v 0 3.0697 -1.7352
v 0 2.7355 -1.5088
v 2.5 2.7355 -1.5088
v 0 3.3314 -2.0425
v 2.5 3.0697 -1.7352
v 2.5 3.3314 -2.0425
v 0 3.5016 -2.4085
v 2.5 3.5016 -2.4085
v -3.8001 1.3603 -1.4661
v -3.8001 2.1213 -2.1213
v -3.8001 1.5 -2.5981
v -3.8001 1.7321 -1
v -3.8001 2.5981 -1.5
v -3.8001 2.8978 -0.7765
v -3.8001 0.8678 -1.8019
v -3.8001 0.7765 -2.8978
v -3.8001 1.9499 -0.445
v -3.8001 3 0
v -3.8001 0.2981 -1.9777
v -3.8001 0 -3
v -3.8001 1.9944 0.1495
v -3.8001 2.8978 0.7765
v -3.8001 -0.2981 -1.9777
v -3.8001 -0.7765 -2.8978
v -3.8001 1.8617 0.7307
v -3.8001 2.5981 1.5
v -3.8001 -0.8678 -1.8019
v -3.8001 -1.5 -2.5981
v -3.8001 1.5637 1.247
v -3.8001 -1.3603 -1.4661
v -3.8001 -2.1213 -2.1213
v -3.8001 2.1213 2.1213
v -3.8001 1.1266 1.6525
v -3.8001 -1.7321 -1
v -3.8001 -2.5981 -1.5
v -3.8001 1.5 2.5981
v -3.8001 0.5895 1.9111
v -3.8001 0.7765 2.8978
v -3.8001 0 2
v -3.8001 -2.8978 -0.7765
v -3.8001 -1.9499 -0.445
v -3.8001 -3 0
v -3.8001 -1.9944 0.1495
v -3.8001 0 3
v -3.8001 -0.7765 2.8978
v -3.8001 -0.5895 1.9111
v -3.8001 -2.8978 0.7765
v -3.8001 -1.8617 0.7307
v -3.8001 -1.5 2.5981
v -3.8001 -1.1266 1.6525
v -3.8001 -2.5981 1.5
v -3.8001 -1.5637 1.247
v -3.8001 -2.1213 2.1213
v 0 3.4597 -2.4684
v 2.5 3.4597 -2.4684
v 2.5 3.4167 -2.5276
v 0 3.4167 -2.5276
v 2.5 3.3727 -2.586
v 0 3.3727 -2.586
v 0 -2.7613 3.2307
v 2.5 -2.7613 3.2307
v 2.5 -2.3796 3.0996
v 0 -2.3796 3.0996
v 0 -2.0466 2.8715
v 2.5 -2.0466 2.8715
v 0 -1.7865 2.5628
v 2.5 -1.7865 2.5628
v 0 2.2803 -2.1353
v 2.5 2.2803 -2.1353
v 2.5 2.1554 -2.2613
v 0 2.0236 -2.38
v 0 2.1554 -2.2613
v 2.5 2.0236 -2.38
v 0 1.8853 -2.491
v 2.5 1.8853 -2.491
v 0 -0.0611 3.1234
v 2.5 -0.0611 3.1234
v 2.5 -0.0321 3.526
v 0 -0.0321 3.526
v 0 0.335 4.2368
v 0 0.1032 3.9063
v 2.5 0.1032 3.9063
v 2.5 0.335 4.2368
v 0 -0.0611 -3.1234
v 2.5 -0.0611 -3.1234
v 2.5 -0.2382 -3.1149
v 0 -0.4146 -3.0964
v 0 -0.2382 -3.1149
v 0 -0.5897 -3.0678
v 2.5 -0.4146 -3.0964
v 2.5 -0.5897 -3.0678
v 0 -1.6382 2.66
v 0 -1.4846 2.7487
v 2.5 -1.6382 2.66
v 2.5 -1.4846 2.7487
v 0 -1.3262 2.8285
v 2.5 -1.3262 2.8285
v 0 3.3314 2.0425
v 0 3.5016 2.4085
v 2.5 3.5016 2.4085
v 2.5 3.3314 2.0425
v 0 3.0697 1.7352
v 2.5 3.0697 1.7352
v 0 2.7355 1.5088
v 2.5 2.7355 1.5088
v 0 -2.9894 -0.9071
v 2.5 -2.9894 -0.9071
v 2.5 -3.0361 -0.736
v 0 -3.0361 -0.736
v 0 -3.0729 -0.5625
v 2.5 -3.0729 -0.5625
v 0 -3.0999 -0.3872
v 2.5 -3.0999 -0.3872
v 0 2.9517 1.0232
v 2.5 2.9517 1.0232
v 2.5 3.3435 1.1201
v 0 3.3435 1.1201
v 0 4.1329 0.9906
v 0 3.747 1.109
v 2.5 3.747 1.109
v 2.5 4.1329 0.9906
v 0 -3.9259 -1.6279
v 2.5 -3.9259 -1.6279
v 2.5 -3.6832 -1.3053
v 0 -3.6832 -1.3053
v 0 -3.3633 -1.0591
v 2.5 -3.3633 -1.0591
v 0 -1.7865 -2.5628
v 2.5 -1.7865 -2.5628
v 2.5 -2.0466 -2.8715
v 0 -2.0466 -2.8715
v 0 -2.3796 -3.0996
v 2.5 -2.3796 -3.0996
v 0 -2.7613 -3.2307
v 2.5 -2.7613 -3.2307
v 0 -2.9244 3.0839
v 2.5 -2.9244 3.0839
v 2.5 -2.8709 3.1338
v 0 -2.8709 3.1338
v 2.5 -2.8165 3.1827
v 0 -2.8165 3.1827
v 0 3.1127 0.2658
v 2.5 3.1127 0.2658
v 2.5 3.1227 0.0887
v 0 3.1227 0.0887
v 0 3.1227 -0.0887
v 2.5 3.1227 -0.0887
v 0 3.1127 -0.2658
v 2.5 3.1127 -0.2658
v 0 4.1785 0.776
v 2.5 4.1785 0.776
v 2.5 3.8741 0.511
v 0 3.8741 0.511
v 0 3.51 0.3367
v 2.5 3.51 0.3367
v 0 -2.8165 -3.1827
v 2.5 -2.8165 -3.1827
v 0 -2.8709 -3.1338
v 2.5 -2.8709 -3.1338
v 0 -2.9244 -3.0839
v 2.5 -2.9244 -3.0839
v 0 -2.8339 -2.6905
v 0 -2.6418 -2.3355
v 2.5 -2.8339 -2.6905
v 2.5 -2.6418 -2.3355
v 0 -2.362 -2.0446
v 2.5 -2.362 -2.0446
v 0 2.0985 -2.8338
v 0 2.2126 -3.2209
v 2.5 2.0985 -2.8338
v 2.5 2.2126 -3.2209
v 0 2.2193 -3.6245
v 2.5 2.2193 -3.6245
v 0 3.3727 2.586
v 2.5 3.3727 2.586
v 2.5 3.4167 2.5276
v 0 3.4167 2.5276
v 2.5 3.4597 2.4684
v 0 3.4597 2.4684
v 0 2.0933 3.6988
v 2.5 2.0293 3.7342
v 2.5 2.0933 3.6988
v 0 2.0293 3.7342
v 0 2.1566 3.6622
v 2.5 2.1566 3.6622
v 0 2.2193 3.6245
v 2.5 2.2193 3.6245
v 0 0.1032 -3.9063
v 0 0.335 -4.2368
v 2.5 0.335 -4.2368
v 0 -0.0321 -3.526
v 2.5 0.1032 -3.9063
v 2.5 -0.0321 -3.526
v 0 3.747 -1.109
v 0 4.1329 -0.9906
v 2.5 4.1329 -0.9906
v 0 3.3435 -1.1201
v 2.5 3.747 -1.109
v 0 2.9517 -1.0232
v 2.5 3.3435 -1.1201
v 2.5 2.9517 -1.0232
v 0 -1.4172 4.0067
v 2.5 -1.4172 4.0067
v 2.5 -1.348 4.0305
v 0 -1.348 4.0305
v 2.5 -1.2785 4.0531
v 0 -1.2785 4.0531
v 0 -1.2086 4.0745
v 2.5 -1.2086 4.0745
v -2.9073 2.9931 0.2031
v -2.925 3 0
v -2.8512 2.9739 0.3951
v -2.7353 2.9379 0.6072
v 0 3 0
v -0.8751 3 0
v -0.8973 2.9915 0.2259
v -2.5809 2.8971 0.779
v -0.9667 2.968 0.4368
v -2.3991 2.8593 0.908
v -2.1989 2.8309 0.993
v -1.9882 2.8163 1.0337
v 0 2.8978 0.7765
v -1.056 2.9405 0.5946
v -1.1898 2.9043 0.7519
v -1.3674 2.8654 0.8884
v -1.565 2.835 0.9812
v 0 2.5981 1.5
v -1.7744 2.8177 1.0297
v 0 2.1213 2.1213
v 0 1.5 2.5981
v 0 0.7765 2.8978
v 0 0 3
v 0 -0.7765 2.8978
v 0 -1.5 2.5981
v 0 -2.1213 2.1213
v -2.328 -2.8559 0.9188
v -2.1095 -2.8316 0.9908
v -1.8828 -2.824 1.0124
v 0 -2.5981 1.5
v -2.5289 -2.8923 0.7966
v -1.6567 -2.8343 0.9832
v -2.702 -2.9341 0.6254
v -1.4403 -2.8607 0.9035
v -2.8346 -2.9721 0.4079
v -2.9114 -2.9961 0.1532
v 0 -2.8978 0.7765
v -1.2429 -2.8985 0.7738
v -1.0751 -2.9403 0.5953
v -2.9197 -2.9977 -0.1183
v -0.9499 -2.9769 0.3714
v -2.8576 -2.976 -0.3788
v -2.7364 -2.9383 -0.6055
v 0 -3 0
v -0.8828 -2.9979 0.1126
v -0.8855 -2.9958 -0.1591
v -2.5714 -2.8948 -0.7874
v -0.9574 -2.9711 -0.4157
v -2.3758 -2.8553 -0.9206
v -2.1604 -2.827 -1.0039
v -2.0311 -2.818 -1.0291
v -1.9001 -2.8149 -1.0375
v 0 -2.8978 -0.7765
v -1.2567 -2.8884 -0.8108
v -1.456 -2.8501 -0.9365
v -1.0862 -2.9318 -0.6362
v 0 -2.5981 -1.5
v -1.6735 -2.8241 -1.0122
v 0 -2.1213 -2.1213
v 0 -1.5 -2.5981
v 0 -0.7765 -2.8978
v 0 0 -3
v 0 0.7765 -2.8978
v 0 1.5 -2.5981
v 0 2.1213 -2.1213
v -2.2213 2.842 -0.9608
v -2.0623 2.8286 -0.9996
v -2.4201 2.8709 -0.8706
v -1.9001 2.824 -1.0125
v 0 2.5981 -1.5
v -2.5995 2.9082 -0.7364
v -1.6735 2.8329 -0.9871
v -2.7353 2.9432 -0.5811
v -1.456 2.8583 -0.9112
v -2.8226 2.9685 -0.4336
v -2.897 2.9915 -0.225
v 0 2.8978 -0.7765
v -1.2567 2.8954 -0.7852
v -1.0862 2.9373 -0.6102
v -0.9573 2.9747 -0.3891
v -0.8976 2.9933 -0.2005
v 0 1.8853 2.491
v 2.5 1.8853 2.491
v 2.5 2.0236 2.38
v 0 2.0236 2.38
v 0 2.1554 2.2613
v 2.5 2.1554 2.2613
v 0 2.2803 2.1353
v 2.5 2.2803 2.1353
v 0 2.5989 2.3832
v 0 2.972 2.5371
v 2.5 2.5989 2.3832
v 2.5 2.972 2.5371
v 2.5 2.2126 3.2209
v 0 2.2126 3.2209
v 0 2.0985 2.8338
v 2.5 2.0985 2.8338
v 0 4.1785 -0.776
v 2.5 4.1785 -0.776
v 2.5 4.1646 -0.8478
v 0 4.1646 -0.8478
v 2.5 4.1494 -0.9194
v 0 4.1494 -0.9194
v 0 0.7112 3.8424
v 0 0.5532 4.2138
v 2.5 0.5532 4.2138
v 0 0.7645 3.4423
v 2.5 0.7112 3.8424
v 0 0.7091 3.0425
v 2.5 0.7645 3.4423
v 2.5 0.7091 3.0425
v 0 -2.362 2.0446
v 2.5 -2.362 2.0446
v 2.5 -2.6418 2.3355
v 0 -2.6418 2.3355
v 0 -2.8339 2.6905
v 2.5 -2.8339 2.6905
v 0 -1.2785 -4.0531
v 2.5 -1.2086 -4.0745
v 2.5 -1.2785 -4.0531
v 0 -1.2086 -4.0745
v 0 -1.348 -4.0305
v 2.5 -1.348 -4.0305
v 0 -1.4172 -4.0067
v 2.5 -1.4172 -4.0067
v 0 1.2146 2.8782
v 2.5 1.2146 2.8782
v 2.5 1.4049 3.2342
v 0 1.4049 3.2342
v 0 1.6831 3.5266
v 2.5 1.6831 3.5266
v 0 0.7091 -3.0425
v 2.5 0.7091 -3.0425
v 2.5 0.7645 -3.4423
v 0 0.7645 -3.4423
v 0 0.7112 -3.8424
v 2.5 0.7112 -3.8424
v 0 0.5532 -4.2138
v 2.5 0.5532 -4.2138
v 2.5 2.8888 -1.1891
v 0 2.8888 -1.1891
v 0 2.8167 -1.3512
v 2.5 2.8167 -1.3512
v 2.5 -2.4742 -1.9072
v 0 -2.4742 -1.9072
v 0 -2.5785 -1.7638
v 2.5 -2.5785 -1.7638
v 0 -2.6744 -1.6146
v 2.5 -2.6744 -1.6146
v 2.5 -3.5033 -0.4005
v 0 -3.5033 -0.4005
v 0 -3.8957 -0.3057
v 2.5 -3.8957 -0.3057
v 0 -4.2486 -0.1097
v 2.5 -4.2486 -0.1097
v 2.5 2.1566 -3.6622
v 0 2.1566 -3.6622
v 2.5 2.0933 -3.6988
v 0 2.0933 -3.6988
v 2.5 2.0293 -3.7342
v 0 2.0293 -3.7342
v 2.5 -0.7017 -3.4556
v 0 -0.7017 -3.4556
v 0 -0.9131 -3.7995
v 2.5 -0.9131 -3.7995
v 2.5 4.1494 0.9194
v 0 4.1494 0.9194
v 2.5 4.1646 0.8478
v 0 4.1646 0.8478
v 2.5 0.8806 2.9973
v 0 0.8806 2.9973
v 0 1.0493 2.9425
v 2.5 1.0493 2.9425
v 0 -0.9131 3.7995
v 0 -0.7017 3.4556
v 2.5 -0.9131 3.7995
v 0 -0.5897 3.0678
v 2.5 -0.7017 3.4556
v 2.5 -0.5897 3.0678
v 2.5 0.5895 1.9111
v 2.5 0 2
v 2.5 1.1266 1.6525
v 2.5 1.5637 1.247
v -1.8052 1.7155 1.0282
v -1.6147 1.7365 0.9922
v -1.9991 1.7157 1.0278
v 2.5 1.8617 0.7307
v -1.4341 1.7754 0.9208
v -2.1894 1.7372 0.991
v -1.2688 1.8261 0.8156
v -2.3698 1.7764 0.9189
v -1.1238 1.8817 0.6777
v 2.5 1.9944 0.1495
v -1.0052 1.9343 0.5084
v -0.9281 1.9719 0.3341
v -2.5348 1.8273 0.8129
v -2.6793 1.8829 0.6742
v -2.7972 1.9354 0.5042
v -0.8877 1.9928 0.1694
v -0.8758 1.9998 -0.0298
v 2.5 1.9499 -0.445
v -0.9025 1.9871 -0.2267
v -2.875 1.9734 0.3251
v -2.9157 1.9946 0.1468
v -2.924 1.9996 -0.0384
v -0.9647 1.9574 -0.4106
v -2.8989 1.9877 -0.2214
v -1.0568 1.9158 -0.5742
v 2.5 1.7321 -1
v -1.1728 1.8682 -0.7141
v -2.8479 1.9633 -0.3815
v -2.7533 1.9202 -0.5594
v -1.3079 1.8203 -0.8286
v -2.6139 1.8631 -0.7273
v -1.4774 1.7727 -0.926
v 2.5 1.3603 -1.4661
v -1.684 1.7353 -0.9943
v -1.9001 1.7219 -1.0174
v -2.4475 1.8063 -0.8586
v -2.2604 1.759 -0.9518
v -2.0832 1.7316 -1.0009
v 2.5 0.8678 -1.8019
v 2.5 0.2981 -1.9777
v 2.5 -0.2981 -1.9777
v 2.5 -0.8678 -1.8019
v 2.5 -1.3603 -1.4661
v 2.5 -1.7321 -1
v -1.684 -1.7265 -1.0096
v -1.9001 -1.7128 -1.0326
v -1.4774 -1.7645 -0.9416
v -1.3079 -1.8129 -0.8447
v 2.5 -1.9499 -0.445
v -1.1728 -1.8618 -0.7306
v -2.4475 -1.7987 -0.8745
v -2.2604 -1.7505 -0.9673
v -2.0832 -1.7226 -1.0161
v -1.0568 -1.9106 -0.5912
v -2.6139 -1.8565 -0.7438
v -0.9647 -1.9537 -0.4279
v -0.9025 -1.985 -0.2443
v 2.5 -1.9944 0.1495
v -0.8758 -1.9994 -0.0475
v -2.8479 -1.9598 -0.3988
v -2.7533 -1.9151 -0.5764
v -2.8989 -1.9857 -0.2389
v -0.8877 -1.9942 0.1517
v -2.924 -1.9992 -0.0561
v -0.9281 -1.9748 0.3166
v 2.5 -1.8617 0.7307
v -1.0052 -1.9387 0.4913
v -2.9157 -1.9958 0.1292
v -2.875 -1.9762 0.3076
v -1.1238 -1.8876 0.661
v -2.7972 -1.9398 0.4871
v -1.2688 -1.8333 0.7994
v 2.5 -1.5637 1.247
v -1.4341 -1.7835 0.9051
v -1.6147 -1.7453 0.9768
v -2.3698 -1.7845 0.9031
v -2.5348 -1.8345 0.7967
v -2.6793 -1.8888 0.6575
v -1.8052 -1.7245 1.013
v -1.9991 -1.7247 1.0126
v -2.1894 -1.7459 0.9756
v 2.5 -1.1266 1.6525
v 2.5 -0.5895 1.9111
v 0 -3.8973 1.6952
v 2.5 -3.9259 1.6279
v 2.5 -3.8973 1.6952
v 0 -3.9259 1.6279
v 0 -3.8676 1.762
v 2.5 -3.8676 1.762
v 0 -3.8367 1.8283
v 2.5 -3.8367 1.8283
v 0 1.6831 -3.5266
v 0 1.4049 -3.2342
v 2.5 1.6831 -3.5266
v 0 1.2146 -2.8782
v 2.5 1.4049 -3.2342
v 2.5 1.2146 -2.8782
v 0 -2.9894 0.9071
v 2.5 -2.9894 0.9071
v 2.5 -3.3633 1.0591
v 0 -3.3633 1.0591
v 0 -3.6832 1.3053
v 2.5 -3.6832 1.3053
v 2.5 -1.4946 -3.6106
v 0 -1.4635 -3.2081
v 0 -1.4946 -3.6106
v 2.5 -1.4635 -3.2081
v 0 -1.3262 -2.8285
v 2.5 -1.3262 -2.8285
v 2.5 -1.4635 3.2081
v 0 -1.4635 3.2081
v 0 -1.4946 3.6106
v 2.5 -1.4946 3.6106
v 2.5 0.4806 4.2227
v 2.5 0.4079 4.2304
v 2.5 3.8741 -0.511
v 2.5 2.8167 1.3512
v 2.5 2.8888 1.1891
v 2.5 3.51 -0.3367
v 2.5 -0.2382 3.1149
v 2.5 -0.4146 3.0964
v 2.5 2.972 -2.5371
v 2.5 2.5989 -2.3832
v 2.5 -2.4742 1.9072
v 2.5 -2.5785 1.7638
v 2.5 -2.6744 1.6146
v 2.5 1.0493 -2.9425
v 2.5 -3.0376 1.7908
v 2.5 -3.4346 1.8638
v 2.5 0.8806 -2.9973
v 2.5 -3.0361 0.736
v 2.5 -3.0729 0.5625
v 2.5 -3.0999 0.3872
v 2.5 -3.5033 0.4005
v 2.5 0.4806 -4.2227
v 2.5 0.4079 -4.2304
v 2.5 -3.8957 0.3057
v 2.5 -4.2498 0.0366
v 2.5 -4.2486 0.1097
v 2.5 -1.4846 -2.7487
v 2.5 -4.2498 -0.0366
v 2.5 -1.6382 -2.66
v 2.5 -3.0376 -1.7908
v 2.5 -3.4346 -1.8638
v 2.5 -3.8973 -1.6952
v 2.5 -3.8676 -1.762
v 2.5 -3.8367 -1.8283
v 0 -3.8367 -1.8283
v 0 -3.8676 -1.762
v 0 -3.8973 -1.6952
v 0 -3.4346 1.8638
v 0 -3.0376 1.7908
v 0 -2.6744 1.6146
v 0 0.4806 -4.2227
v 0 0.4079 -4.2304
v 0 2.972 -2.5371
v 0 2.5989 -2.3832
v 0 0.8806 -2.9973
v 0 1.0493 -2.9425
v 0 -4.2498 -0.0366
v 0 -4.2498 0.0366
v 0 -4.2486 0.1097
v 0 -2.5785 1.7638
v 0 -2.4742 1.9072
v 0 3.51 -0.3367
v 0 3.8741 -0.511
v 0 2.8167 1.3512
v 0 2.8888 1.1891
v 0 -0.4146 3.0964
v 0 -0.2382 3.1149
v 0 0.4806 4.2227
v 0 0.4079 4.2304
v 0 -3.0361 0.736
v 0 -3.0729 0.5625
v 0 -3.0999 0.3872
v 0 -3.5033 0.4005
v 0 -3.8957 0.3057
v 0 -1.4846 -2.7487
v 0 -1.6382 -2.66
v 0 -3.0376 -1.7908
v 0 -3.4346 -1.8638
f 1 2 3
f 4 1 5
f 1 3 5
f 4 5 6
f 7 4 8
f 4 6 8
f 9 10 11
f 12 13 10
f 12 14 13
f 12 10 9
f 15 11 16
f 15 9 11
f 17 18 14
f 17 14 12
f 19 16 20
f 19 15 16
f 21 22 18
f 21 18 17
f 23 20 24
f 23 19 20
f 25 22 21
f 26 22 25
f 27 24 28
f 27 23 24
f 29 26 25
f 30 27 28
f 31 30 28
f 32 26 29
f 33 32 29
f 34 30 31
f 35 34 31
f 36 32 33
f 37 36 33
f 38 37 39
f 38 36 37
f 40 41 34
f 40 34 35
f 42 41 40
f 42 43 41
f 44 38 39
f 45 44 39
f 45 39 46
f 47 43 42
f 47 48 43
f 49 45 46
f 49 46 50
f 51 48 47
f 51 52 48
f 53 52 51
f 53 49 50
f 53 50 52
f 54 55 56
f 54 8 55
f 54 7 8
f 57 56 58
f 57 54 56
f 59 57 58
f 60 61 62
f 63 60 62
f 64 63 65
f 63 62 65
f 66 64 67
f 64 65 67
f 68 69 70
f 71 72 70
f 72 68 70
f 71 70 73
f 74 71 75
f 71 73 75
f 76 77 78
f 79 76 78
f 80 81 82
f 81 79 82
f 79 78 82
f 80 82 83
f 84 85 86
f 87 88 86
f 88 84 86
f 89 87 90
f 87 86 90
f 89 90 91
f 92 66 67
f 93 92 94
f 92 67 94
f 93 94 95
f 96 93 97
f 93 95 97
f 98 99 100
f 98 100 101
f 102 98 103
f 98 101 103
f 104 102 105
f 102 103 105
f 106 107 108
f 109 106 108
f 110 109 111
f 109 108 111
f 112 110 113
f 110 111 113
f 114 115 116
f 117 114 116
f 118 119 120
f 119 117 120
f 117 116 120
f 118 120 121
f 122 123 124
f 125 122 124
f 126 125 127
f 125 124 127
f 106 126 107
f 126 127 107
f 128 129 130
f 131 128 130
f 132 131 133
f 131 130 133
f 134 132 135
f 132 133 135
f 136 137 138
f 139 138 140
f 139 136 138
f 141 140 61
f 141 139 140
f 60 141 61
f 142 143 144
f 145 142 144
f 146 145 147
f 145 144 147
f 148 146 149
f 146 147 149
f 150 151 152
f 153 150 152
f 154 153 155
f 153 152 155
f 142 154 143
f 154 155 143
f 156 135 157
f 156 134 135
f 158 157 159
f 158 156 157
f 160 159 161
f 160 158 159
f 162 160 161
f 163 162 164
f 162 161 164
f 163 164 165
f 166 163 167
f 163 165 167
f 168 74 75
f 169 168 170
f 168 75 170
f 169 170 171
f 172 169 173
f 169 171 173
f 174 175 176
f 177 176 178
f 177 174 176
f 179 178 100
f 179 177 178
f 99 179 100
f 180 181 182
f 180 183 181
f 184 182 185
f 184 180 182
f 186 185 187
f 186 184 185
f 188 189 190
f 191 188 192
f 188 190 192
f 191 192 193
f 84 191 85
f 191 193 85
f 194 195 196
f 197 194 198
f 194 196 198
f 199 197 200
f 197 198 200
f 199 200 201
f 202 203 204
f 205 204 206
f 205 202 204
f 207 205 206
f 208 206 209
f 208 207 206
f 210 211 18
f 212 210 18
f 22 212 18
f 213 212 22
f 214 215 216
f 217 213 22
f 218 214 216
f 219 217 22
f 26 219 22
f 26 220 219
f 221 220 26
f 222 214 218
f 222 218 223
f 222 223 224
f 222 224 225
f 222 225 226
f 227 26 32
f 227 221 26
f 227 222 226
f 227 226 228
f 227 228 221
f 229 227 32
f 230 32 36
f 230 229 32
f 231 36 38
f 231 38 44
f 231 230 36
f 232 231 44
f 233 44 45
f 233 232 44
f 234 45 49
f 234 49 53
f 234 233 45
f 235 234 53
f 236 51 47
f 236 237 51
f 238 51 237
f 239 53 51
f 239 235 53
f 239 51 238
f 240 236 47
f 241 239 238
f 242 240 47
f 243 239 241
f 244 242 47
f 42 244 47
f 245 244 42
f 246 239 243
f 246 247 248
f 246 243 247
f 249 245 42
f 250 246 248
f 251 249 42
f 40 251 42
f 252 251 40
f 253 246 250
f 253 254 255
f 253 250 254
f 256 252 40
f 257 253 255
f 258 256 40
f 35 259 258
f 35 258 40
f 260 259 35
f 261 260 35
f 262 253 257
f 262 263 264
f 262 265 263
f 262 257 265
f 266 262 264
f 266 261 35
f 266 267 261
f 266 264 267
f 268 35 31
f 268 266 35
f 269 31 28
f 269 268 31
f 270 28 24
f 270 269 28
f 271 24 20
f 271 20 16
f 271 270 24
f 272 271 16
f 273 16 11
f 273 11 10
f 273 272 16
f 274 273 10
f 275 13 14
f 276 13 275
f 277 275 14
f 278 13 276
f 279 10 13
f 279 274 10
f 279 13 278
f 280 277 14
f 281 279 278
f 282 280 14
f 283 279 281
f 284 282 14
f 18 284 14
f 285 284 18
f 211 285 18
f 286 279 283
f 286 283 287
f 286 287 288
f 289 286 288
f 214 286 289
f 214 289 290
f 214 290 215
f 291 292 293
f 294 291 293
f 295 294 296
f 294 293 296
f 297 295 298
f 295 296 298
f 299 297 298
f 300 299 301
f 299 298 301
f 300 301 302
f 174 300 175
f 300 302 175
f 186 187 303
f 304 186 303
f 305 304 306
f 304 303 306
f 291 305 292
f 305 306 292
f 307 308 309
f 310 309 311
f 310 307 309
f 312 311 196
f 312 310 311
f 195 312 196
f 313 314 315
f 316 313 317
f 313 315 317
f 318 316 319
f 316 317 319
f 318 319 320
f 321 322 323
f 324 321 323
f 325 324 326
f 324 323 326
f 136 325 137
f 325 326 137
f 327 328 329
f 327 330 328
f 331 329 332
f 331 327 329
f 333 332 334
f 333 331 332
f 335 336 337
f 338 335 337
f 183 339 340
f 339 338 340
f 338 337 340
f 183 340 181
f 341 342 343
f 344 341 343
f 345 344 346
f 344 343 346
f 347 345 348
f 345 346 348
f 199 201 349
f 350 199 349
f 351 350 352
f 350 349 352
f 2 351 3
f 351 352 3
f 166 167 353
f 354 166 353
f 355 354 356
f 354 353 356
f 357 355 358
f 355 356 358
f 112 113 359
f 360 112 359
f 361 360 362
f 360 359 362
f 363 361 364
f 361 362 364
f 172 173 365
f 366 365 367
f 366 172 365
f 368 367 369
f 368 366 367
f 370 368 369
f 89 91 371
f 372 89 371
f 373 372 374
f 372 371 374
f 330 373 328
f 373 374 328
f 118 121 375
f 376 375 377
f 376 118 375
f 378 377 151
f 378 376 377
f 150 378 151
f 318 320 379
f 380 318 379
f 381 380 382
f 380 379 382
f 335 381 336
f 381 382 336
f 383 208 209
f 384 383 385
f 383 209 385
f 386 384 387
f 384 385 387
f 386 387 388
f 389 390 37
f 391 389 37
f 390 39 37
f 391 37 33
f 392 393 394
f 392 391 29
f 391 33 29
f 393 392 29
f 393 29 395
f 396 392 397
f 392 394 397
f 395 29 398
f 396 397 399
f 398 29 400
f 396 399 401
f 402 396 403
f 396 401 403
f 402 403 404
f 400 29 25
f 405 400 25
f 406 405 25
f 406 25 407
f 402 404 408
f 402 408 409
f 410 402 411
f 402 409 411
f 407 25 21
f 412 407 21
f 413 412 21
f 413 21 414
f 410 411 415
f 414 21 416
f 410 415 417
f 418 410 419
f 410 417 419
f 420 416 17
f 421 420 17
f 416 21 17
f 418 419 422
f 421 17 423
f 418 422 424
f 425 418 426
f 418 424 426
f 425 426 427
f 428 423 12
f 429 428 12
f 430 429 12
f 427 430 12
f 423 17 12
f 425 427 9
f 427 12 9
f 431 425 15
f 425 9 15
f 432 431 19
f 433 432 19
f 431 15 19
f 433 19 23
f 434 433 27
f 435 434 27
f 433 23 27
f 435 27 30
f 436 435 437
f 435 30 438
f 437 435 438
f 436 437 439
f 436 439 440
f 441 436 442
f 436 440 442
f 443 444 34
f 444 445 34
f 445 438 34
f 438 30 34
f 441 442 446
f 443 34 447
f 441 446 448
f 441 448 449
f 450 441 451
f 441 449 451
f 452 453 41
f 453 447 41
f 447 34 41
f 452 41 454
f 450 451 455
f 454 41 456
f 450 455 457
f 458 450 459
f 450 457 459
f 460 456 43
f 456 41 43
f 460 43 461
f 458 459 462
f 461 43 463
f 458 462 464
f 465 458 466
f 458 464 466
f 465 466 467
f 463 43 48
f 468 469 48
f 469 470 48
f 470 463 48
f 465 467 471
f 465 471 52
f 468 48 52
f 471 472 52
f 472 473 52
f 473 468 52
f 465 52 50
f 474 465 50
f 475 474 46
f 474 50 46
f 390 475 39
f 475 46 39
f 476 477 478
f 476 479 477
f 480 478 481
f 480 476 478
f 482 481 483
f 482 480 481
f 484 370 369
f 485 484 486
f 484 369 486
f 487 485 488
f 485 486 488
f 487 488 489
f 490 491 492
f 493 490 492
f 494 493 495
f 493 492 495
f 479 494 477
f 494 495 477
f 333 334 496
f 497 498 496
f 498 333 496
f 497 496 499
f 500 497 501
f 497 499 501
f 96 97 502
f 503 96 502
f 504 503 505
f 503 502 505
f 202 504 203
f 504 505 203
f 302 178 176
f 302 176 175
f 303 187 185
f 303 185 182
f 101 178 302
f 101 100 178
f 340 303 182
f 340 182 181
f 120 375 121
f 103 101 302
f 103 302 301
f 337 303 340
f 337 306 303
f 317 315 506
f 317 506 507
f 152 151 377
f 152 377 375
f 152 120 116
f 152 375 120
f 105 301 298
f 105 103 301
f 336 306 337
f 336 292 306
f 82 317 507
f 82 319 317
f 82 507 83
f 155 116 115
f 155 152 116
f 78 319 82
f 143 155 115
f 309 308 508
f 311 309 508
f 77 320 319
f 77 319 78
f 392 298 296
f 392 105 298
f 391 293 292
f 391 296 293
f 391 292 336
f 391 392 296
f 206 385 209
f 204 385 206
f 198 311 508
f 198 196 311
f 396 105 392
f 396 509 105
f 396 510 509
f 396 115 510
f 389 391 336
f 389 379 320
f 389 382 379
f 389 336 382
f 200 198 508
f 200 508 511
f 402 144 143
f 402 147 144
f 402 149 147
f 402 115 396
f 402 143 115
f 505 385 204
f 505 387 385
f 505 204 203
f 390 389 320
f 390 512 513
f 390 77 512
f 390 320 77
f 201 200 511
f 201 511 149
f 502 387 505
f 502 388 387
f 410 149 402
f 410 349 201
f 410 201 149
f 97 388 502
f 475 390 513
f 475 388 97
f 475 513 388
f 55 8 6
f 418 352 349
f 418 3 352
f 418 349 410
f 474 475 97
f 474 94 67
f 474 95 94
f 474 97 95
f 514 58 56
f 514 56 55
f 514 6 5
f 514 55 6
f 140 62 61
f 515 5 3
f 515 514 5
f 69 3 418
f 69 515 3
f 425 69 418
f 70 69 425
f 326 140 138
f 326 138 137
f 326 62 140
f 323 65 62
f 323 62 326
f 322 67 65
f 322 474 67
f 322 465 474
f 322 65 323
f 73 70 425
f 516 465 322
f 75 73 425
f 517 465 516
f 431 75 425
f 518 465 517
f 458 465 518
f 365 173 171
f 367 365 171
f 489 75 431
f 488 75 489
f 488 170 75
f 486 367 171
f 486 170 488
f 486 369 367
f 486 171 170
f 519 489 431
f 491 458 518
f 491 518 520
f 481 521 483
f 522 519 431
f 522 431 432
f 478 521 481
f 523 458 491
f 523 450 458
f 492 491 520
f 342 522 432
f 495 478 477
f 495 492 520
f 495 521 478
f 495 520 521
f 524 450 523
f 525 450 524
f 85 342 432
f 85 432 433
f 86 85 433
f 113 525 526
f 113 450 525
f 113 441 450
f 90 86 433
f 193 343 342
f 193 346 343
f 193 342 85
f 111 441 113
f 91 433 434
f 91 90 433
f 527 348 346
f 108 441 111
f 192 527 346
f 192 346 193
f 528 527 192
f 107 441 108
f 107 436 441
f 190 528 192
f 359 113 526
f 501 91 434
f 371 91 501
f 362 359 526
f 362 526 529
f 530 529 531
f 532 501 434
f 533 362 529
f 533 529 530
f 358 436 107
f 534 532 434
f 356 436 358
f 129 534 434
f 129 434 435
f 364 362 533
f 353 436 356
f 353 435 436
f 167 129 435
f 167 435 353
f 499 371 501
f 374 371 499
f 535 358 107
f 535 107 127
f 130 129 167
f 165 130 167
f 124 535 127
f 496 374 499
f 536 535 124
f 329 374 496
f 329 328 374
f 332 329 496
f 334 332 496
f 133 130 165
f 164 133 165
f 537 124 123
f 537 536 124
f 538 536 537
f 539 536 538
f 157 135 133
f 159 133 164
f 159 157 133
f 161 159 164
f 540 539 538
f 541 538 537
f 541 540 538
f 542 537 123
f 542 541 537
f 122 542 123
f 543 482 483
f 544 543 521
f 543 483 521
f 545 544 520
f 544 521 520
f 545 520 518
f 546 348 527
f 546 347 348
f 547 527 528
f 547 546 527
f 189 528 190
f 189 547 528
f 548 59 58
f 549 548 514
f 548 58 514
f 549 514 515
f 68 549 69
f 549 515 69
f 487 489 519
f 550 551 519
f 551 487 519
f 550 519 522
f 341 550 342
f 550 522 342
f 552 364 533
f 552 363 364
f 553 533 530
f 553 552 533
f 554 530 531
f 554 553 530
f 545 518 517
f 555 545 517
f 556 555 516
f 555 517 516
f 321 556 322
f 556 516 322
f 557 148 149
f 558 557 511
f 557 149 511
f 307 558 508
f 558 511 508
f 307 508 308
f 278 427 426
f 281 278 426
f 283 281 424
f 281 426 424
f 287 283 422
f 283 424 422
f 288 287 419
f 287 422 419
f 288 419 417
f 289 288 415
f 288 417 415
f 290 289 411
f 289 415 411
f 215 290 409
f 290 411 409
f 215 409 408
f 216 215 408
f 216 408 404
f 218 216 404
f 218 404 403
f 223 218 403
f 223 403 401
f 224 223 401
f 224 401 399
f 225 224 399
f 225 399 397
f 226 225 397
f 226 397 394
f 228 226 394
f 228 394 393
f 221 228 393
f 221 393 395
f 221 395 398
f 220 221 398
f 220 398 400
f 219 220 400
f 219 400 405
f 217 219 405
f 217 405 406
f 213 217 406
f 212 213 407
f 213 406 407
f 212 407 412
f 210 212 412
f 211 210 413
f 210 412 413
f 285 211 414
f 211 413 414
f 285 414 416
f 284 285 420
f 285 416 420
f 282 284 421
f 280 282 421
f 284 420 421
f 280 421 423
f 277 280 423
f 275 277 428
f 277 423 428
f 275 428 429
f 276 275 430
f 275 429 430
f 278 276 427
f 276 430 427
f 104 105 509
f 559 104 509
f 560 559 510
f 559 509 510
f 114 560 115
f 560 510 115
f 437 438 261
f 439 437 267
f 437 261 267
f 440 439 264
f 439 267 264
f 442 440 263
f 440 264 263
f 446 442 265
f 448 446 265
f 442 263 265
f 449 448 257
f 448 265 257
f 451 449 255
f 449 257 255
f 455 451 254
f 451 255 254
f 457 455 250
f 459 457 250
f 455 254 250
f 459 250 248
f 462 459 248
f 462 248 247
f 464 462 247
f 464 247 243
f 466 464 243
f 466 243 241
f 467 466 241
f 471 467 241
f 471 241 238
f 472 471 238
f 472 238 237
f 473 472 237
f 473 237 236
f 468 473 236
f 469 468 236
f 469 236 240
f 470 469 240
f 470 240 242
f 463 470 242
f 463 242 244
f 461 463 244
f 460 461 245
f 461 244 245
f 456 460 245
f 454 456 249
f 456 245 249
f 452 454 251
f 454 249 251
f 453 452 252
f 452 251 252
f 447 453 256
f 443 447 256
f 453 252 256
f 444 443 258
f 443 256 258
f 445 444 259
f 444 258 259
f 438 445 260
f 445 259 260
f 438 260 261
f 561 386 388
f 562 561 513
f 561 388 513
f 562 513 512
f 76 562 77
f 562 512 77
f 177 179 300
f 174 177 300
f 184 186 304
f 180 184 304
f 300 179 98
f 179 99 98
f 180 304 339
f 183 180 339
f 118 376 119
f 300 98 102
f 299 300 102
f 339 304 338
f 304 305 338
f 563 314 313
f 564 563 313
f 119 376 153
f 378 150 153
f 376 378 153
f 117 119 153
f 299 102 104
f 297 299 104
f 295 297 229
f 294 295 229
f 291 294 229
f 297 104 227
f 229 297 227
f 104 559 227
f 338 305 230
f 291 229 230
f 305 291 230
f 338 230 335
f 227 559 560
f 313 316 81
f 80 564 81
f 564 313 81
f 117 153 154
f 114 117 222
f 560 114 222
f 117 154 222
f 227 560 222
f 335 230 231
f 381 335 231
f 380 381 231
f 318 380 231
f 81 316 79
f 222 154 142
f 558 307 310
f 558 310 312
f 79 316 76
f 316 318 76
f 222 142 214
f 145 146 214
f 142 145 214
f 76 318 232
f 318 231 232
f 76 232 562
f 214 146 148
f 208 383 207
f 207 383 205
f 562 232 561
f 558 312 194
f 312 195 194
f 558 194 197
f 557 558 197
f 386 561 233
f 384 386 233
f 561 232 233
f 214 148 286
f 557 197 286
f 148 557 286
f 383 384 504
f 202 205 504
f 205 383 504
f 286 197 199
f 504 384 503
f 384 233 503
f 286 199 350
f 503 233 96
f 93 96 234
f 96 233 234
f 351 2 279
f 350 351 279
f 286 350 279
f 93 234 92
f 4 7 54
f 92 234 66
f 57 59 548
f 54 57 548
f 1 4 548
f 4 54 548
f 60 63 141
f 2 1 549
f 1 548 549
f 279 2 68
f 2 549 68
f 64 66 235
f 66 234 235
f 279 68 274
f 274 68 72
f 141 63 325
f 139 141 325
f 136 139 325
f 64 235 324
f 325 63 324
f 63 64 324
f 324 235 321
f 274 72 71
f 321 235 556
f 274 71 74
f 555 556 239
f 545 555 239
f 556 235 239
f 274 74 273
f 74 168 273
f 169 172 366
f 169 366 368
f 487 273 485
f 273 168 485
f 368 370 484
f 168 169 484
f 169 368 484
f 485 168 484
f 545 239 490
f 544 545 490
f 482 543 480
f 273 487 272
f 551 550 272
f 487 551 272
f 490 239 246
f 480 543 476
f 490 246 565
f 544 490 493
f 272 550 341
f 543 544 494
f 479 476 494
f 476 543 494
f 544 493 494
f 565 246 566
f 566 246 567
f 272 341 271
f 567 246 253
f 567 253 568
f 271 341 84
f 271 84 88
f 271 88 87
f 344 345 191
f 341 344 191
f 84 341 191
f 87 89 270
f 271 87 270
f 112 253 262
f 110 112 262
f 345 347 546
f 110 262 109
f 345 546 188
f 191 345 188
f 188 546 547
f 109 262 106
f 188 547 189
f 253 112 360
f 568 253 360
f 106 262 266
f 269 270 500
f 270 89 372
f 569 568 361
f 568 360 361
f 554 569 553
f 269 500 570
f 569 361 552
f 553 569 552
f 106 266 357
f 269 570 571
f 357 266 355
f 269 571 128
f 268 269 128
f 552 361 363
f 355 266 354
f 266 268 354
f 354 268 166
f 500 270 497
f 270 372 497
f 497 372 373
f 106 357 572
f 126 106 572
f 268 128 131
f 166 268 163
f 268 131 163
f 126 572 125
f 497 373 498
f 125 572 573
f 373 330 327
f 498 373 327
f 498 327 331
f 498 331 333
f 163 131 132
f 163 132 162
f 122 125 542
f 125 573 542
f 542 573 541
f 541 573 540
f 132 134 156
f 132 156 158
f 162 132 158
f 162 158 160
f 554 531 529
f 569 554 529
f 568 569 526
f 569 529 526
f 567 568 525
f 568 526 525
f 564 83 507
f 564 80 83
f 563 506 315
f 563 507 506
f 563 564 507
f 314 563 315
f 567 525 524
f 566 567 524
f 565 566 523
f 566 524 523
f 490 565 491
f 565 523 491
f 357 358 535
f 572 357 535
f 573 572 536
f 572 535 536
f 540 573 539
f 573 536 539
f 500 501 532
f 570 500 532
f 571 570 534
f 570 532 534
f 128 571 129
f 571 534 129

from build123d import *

# Parameters (mm, degrees)
SKETCH1_W                          = 2.5
SKETCH1_H                          = 4.25
CUT_EXTRUDE1_DEPTH                 = 3.5
CUT_EXTRUDE2_DEPTH                 = 3.5
CUT_EXTRUDE3_DEPTH                 = 3.5
CUT_EXTRUDE4_DEPTH                 = 3.5
CUT_EXTRUDE5_DEPTH                 = 3.5
CUT_EXTRUDE6_DEPTH                 = 3.5
CUT_EXTRUDE7_DEPTH                 = 3.5
CUT_EXTRUDE8_DEPTH                 = 3.5
CUT_EXTRUDE9_DEPTH                 = 3.5
CUT_EXTRUDE10_DEPTH                = 3.5
CUT_EXTRUDE11_DEPTH                = 3.5
CUT_EXTRUDE12_DEPTH                = 3.5
CUT_EXTRUDE13_DEPTH                = 3.5
CUT_EXTRUDE14_DEPTH                = 3.5
CUT_EXTRUDE15_DEPTH                = 3.5
SKETCH17_W                         = 3.8000508
SKETCH17_H                         = 3
F_4_0_4_DIAMETER_HOLE1_D           = 4
F_4_0_4_DIAMETER_HOLE1_DEPTH       = 6.3000508
TAP_DRILL_FOR_M2_5X0_45_TAP1_D     = 2.05
TAP_DRILL_FOR_M2_5X0_45_TAP1_DEPTH = 6


with BuildPart() as part:
    # Sketch1 → Revolve1 (revolve)
    with BuildSketch(Plane(origin=(0, 0, 0), x_dir=(-1, 0, 0), z_dir=(0, 0, -1))):
        with Locations((-1.25, 2.125)):
            Rectangle(SKETCH1_W, SKETCH1_H)
    revolve(axis=Axis((2.5, 0, 0), (-1, 0, 0)))

    # Sketch2 → Cut-Extrude1 (cut, through all)
    with BuildSketch(Plane(origin=(2.5, 0, 0), x_dir=(0, 0, -1), z_dir=(1, 0, 0))):
        with BuildLine():
            ThreePointArc((2.585993953, 3.372704445), (2.472774023, 2.780247912), (2.135335156, 2.280289405))
            ThreePointArc((2.135335156, 2.280289405), (2.321584435, 2.090364014), (2.491001044, 1.88528242))
            ThreePointArc((2.491001044, 1.88528242), (3.023492692, 2.168612866), (3.624538392, 2.219283994))
            ThreePointArc((3.624538392, 2.219283994), (3.158365508, 2.843805077), (2.585993953, 3.372704445))
        make_face()
    extrude(amount=-CUT_EXTRUDE1_DEPTH, mode=Mode.SUBTRACT)

    # Sketch3 → Cut-Extrude2 (cut, through all)
    with BuildSketch(Plane(origin=(2.5, 0, 0), x_dir=(0, 0, -1), z_dir=(1, 0, 0))):
        with BuildLine():
            ThreePointArc((3.734225512, 2.029300328), (3.389820178, 1.534115047), (2.87820299, 1.214628975))
            ThreePointArc((2.87820299, 1.214628975), (2.971100557, 0.96536909), (3.042456131, 0.709109787))
            ThreePointArc((3.042456131, 0.709109787), (3.644152332, 0.751361165), (4.213844705, 0.553184234))
            ThreePointArc((4.213844705, 0.553184234), (4.041990194, 1.313322226), (3.734225512, 2.029300328))
        make_face()
    extrude(amount=-CUT_EXTRUDE2_DEPTH, mode=Mode.SUBTRACT)

    # Sketch4 → Cut-Extrude3 (cut, through all)
    with BuildSketch(Plane(origin=(2.5, 0, 0), x_dir=(0, 0, -1), z_dir=(1, 0, 0))):
        with BuildLine():
            ThreePointArc((4.236775558, 0.335011746), (3.72073563, 0.022719752), (3.12340338, -0.061051839))
            ThreePointArc((3.12340338, -0.061051839), (3.106886401, -0.326546919), (3.067842913, -0.589674367))
            ThreePointArc((3.067842913, -0.589674367), (3.634704928, -0.795807707), (4.074538988, -1.208566106))
            ThreePointArc((4.074538988, -1.208566106), (4.226718055, -0.444245969), (4.236775558, 0.335011746))
        make_face()
    extrude(amount=-CUT_EXTRUDE3_DEPTH, mode=Mode.SUBTRACT)

    # Sketch5 → Cut-Extrude4 (cut, through all)
    with BuildSketch(Plane(origin=(2.5, 0, 0), x_dir=(0, 0, -1), z_dir=(1, 0, 0))):
        with BuildLine():
            ThreePointArc((4.00674862, -1.417203408), (3.40830209, -1.492603993), (2.82853895, -1.326176235))
            ThreePointArc((2.82853895, -1.326176235), (2.705463361, -1.562), (2.562771785, -1.786498468))
            ThreePointArc((2.562771785, -1.786498468), (2.996784021, -2.205374197), (3.230708464, -2.761344386))
            ThreePointArc((3.230708464, -2.761344386), (3.680607966, -2.124999999), (4.00674862, -1.417203408))
        make_face()
    extrude(amount=-CUT_EXTRUDE4_DEPTH, mode=Mode.SUBTRACT)

    # Sketch6 → Cut-Extrude5 (cut, through all)
    with BuildSketch(Plane(origin=(2.5, 0, 0), x_dir=(0, 0, -1), z_dir=(1, 0, 0))):
        with BuildLine():
            ThreePointArc((3.083918444, -2.92437122), (2.506542154, -2.749842949), (2.044594439, -2.361992714))
            ThreePointArc((2.044594439, -2.361992714), (1.836241128, -2.52736909), (1.614574134, -2.674420753))
            ThreePointArc((1.614574134, -2.674420753), (1.840691933, -3.233611452), (1.828259097, -3.836661137))
            ThreePointArc((1.828259097, -3.836661137), (2.498087322, -3.438322226), (3.083918444, -2.92437122))
        make_face()
    extrude(amount=-CUT_EXTRUDE5_DEPTH, mode=Mode.SUBTRACT)

    # Sketch7 → Cut-Extrude6 (cut, through all)
    with BuildSketch(Plane(origin=(2.5, 0, 0), x_dir=(0, 0, -1), z_dir=(1, 0, 0))):
        with BuildLine():
            ThreePointArc((1.627850754, -3.925888679), (1.17137831, -3.531609077), (0.907120976, -2.989399193))
            ThreePointArc((0.907120976, -2.989399193), (0.649516122, -3.055733105), (0.387201946, -3.099911394))
            ThreePointArc((0.387201946, -3.099911394), (0.366327487, -3.702727912), (0.109687121, -4.248584321))
            ThreePointArc((0.109687121, -4.248584321), (0.883624686, -4.157127303), (1.627850754, -3.925888679))
        make_face()
    extrude(amount=-CUT_EXTRUDE6_DEPTH, mode=Mode.SUBTRACT)

    # Sketch8 → Cut-Extrude7 (cut, through all)
    with BuildSketch(Plane(origin=(2.5, 0, 0), x_dir=(0, 0, -1), z_dir=(1, 0, 0))):
        with BuildLine():
            ThreePointArc((-0.109687122, -4.248584322), (-0.366327487, -3.702727912), (-0.387201947, -3.099911394))
            ThreePointArc((-0.387201947, -3.099911394), (-0.649516122, -3.055733105), (-0.907120975, -2.989399193))
            ThreePointArc((-0.907120975, -2.989399193), (-1.171378309, -3.531609077), (-1.627850753, -3.92588868))
            ThreePointArc((-1.627850753, -3.92588868), (-0.883624686, -4.157127304), (-0.109687122, -4.248584322))
        make_face()
    extrude(amount=-CUT_EXTRUDE7_DEPTH, mode=Mode.SUBTRACT)

    # Sketch9 → Cut-Extrude8 (cut, through all)
    with BuildSketch(Plane(origin=(2.5, 0, 0), x_dir=(0, 0, -1), z_dir=(1, 0, 0))):
        with BuildLine():
            ThreePointArc((-1.828259096, -3.836661137), (-1.840691932, -3.233611453), (-1.614574133, -2.674420754))
            ThreePointArc((-1.614574133, -2.674420754), (-1.836241128, -2.527369091), (-2.044594439, -2.361992714))
            ThreePointArc((-2.044594439, -2.361992714), (-2.506542155, -2.749842949), (-3.083918444, -2.92437122))
            ThreePointArc((-3.083918444, -2.92437122), (-2.498087322, -3.438322226), (-1.828259096, -3.836661137))
        make_face()
    extrude(amount=-CUT_EXTRUDE8_DEPTH, mode=Mode.SUBTRACT)

    # Sketch10 → Cut-Extrude9 (cut, through all)
    with BuildSketch(Plane(origin=(2.5, 0, 0), x_dir=(0, 0, -1), z_dir=(1, 0, 0))):
        with BuildLine():
            ThreePointArc((-3.230708464, -2.761344387), (-2.996784021, -2.205374197), (-2.562771785, -1.786498468))
            ThreePointArc((-2.562771785, -1.786498468), (-2.705463361, -1.562), (-2.82853895, -1.326176236))
            ThreePointArc((-2.82853895, -1.326176236), (-3.40830209, -1.492603994), (-4.006748619, -1.417203409))
            ThreePointArc((-4.006748619, -1.417203409), (-3.680607966, -2.125), (-3.230708464, -2.761344387))
        make_face()
    extrude(amount=-CUT_EXTRUDE9_DEPTH, mode=Mode.SUBTRACT)

    # Sketch11 → Cut-Extrude10 (cut, through all)
    with BuildSketch(Plane(origin=(2.5, 0, 0), x_dir=(0, 0, -1), z_dir=(1, 0, 0))):
        with BuildLine():
            ThreePointArc((-4.074538989, -1.208566105), (-3.634704928, -0.795807707), (-3.067842914, -0.589674368))
            ThreePointArc((-3.067842914, -0.589674368), (-3.106886402, -0.326546919), (-3.12340338, -0.061051839))
            ThreePointArc((-3.12340338, -0.061051839), (-3.720735631, 0.022719752), (-4.236775558, 0.335011747))
            ThreePointArc((-4.236775558, 0.335011747), (-4.226718056, -0.444245968), (-4.074538989, -1.208566105))
        make_face()
    extrude(amount=-CUT_EXTRUDE10_DEPTH, mode=Mode.SUBTRACT)

    # Sketch12 → Cut-Extrude11 (cut, through all)
    with BuildSketch(Plane(origin=(2.5, 0, 0), x_dir=(0, 0, -1), z_dir=(1, 0, 0))):
        with BuildLine():
            ThreePointArc((-4.213844706, 0.553184234), (-3.644152332, 0.751361165), (-3.042456131, 0.709109788))
            ThreePointArc((-3.042456131, 0.709109788), (-2.971100557, 0.96536909), (-2.87820299, 1.214628975))
            ThreePointArc((-2.87820299, 1.214628975), (-3.389820179, 1.534115046), (-3.734225513, 2.029300326))
            ThreePointArc((-3.734225513, 2.029300326), (-4.041990195, 1.313322226), (-4.213844706, 0.553184234))
        make_face()
    extrude(amount=-CUT_EXTRUDE11_DEPTH, mode=Mode.SUBTRACT)

    # Sketch13 → Cut-Extrude12 (cut, through all)
    with BuildSketch(Plane(origin=(2.5, 0, 0), x_dir=(0, 0, -1), z_dir=(1, 0, 0))):
        with BuildLine():
            ThreePointArc((-2.585993952, 3.372704446), (-3.158365508, 2.843805077), (-3.624538391, 2.219283994))
            ThreePointArc((-3.624538391, 2.219283994), (-3.023492692, 2.168612865), (-2.491001044, 1.885282419))
            ThreePointArc((-2.491001044, 1.885282419), (-2.321584435, 2.090364014), (-2.135335156, 2.280289405))
            ThreePointArc((-2.135335156, 2.280289405), (-2.472774022, 2.780247912), (-2.585993952, 3.372704446))
        make_face()
    extrude(amount=-CUT_EXTRUDE12_DEPTH, mode=Mode.SUBTRACT)

    # Sketch14 → Cut-Extrude13 (cut, through all)
    with BuildSketch(Plane(origin=(2.5, 0, 0), x_dir=(0, 0, -1), z_dir=(1, 0, 0))):
        with BuildLine():
            ThreePointArc((-0.990620545, 4.132937326), (-1.728630733, 3.882568195), (-2.408516462, 3.501649391))
            ThreePointArc((-2.408516462, 3.501649391), (-1.880043697, 3.210891701), (-1.508829246, 2.735472593))
            ThreePointArc((-1.508829246, 2.735472593), (-1.270645273, 2.85391601), (-1.023248474, 2.951667081))
            ThreePointArc((-1.023248474, 2.951667081), (-1.128162774, 3.545650656), (-0.990620545, 4.132937326))
        make_face()
    extrude(amount=-CUT_EXTRUDE13_DEPTH, mode=Mode.SUBTRACT)

    # Sketch15 → Cut-Extrude14 (cut, through all)
    with BuildSketch(Plane(origin=(2.5, 0, 0), x_dir=(0, 0, -1), z_dir=(1, 0, 0))):
        with BuildLine():
            ThreePointArc((-0.776040155, 4.178547795), (-0.411518069, 3.69797819), (-0.265767165, 3.112674704))
            ThreePointArc((-0.265767165, 3.112674704), (0, 3.124), (0.265767165, 3.112674704))
            ThreePointArc((0.265767165, 3.112674704), (0.411518069, 3.69797819), (0.776040156, 4.178547795))
            ThreePointArc((0.776040156, 4.178547795), (0, 4.25), (-0.776040155, 4.178547795))
        make_face()
    extrude(amount=-CUT_EXTRUDE14_DEPTH, mode=Mode.SUBTRACT)

    # Sketch16 → Cut-Extrude15 (cut, through all)
    with BuildSketch(Plane(origin=(2.5, 0, 0), x_dir=(0, 0, -1), z_dir=(1, 0, 0))):
        with BuildLine():
            ThreePointArc((0.990620545, 4.132937326), (1.128162774, 3.545650656), (1.023248474, 2.951667081))
            ThreePointArc((1.023248474, 2.951667081), (1.270645273, 2.85391601), (1.508829246, 2.735472593))
            ThreePointArc((1.508829246, 2.735472593), (1.880043697, 3.210891701), (2.408516462, 3.50164939))
            ThreePointArc((2.408516462, 3.50164939), (1.728630733, 3.882568195), (0.990620545, 4.132937326))
        make_face()
    extrude(amount=-CUT_EXTRUDE15_DEPTH, mode=Mode.SUBTRACT)

    # Sketch17 → Revolve2 (revolve)
    with BuildSketch(Plane.XY):
        with Locations((-1.9000254, 1.5)):
            Rectangle(SKETCH17_W, SKETCH17_H)
    revolve(axis=Axis((-3.8000508, 0, 0), (1, 0, 0)))

    # Ø4.0 (4) Diameter Hole1
    with Locations(Plane(origin=(2.5, 0, 0), x_dir=(0, 0, -1), z_dir=(1, 0, 0))):
        with Locations((0, 0)):
            Hole(F_4_0_4_DIAMETER_HOLE1_D / 2, depth=F_4_0_4_DIAMETER_HOLE1_DEPTH)

    # Tap Drill for M2.5x0.45 Tap1
    with Locations(Plane(origin=(-1.9000508, 2.999970615, 0.013278053), x_dir=(0, -0.004426018, 0.999990205), z_dir=(0, 0.999990205, 0.004426018))):
        with Locations((0, 0)):
            Hole(TAP_DRILL_FOR_M2_5X0_45_TAP1_D / 2, depth=TAP_DRILL_FOR_M2_5X0_45_TAP1_DEPTH)


solid = part.part
